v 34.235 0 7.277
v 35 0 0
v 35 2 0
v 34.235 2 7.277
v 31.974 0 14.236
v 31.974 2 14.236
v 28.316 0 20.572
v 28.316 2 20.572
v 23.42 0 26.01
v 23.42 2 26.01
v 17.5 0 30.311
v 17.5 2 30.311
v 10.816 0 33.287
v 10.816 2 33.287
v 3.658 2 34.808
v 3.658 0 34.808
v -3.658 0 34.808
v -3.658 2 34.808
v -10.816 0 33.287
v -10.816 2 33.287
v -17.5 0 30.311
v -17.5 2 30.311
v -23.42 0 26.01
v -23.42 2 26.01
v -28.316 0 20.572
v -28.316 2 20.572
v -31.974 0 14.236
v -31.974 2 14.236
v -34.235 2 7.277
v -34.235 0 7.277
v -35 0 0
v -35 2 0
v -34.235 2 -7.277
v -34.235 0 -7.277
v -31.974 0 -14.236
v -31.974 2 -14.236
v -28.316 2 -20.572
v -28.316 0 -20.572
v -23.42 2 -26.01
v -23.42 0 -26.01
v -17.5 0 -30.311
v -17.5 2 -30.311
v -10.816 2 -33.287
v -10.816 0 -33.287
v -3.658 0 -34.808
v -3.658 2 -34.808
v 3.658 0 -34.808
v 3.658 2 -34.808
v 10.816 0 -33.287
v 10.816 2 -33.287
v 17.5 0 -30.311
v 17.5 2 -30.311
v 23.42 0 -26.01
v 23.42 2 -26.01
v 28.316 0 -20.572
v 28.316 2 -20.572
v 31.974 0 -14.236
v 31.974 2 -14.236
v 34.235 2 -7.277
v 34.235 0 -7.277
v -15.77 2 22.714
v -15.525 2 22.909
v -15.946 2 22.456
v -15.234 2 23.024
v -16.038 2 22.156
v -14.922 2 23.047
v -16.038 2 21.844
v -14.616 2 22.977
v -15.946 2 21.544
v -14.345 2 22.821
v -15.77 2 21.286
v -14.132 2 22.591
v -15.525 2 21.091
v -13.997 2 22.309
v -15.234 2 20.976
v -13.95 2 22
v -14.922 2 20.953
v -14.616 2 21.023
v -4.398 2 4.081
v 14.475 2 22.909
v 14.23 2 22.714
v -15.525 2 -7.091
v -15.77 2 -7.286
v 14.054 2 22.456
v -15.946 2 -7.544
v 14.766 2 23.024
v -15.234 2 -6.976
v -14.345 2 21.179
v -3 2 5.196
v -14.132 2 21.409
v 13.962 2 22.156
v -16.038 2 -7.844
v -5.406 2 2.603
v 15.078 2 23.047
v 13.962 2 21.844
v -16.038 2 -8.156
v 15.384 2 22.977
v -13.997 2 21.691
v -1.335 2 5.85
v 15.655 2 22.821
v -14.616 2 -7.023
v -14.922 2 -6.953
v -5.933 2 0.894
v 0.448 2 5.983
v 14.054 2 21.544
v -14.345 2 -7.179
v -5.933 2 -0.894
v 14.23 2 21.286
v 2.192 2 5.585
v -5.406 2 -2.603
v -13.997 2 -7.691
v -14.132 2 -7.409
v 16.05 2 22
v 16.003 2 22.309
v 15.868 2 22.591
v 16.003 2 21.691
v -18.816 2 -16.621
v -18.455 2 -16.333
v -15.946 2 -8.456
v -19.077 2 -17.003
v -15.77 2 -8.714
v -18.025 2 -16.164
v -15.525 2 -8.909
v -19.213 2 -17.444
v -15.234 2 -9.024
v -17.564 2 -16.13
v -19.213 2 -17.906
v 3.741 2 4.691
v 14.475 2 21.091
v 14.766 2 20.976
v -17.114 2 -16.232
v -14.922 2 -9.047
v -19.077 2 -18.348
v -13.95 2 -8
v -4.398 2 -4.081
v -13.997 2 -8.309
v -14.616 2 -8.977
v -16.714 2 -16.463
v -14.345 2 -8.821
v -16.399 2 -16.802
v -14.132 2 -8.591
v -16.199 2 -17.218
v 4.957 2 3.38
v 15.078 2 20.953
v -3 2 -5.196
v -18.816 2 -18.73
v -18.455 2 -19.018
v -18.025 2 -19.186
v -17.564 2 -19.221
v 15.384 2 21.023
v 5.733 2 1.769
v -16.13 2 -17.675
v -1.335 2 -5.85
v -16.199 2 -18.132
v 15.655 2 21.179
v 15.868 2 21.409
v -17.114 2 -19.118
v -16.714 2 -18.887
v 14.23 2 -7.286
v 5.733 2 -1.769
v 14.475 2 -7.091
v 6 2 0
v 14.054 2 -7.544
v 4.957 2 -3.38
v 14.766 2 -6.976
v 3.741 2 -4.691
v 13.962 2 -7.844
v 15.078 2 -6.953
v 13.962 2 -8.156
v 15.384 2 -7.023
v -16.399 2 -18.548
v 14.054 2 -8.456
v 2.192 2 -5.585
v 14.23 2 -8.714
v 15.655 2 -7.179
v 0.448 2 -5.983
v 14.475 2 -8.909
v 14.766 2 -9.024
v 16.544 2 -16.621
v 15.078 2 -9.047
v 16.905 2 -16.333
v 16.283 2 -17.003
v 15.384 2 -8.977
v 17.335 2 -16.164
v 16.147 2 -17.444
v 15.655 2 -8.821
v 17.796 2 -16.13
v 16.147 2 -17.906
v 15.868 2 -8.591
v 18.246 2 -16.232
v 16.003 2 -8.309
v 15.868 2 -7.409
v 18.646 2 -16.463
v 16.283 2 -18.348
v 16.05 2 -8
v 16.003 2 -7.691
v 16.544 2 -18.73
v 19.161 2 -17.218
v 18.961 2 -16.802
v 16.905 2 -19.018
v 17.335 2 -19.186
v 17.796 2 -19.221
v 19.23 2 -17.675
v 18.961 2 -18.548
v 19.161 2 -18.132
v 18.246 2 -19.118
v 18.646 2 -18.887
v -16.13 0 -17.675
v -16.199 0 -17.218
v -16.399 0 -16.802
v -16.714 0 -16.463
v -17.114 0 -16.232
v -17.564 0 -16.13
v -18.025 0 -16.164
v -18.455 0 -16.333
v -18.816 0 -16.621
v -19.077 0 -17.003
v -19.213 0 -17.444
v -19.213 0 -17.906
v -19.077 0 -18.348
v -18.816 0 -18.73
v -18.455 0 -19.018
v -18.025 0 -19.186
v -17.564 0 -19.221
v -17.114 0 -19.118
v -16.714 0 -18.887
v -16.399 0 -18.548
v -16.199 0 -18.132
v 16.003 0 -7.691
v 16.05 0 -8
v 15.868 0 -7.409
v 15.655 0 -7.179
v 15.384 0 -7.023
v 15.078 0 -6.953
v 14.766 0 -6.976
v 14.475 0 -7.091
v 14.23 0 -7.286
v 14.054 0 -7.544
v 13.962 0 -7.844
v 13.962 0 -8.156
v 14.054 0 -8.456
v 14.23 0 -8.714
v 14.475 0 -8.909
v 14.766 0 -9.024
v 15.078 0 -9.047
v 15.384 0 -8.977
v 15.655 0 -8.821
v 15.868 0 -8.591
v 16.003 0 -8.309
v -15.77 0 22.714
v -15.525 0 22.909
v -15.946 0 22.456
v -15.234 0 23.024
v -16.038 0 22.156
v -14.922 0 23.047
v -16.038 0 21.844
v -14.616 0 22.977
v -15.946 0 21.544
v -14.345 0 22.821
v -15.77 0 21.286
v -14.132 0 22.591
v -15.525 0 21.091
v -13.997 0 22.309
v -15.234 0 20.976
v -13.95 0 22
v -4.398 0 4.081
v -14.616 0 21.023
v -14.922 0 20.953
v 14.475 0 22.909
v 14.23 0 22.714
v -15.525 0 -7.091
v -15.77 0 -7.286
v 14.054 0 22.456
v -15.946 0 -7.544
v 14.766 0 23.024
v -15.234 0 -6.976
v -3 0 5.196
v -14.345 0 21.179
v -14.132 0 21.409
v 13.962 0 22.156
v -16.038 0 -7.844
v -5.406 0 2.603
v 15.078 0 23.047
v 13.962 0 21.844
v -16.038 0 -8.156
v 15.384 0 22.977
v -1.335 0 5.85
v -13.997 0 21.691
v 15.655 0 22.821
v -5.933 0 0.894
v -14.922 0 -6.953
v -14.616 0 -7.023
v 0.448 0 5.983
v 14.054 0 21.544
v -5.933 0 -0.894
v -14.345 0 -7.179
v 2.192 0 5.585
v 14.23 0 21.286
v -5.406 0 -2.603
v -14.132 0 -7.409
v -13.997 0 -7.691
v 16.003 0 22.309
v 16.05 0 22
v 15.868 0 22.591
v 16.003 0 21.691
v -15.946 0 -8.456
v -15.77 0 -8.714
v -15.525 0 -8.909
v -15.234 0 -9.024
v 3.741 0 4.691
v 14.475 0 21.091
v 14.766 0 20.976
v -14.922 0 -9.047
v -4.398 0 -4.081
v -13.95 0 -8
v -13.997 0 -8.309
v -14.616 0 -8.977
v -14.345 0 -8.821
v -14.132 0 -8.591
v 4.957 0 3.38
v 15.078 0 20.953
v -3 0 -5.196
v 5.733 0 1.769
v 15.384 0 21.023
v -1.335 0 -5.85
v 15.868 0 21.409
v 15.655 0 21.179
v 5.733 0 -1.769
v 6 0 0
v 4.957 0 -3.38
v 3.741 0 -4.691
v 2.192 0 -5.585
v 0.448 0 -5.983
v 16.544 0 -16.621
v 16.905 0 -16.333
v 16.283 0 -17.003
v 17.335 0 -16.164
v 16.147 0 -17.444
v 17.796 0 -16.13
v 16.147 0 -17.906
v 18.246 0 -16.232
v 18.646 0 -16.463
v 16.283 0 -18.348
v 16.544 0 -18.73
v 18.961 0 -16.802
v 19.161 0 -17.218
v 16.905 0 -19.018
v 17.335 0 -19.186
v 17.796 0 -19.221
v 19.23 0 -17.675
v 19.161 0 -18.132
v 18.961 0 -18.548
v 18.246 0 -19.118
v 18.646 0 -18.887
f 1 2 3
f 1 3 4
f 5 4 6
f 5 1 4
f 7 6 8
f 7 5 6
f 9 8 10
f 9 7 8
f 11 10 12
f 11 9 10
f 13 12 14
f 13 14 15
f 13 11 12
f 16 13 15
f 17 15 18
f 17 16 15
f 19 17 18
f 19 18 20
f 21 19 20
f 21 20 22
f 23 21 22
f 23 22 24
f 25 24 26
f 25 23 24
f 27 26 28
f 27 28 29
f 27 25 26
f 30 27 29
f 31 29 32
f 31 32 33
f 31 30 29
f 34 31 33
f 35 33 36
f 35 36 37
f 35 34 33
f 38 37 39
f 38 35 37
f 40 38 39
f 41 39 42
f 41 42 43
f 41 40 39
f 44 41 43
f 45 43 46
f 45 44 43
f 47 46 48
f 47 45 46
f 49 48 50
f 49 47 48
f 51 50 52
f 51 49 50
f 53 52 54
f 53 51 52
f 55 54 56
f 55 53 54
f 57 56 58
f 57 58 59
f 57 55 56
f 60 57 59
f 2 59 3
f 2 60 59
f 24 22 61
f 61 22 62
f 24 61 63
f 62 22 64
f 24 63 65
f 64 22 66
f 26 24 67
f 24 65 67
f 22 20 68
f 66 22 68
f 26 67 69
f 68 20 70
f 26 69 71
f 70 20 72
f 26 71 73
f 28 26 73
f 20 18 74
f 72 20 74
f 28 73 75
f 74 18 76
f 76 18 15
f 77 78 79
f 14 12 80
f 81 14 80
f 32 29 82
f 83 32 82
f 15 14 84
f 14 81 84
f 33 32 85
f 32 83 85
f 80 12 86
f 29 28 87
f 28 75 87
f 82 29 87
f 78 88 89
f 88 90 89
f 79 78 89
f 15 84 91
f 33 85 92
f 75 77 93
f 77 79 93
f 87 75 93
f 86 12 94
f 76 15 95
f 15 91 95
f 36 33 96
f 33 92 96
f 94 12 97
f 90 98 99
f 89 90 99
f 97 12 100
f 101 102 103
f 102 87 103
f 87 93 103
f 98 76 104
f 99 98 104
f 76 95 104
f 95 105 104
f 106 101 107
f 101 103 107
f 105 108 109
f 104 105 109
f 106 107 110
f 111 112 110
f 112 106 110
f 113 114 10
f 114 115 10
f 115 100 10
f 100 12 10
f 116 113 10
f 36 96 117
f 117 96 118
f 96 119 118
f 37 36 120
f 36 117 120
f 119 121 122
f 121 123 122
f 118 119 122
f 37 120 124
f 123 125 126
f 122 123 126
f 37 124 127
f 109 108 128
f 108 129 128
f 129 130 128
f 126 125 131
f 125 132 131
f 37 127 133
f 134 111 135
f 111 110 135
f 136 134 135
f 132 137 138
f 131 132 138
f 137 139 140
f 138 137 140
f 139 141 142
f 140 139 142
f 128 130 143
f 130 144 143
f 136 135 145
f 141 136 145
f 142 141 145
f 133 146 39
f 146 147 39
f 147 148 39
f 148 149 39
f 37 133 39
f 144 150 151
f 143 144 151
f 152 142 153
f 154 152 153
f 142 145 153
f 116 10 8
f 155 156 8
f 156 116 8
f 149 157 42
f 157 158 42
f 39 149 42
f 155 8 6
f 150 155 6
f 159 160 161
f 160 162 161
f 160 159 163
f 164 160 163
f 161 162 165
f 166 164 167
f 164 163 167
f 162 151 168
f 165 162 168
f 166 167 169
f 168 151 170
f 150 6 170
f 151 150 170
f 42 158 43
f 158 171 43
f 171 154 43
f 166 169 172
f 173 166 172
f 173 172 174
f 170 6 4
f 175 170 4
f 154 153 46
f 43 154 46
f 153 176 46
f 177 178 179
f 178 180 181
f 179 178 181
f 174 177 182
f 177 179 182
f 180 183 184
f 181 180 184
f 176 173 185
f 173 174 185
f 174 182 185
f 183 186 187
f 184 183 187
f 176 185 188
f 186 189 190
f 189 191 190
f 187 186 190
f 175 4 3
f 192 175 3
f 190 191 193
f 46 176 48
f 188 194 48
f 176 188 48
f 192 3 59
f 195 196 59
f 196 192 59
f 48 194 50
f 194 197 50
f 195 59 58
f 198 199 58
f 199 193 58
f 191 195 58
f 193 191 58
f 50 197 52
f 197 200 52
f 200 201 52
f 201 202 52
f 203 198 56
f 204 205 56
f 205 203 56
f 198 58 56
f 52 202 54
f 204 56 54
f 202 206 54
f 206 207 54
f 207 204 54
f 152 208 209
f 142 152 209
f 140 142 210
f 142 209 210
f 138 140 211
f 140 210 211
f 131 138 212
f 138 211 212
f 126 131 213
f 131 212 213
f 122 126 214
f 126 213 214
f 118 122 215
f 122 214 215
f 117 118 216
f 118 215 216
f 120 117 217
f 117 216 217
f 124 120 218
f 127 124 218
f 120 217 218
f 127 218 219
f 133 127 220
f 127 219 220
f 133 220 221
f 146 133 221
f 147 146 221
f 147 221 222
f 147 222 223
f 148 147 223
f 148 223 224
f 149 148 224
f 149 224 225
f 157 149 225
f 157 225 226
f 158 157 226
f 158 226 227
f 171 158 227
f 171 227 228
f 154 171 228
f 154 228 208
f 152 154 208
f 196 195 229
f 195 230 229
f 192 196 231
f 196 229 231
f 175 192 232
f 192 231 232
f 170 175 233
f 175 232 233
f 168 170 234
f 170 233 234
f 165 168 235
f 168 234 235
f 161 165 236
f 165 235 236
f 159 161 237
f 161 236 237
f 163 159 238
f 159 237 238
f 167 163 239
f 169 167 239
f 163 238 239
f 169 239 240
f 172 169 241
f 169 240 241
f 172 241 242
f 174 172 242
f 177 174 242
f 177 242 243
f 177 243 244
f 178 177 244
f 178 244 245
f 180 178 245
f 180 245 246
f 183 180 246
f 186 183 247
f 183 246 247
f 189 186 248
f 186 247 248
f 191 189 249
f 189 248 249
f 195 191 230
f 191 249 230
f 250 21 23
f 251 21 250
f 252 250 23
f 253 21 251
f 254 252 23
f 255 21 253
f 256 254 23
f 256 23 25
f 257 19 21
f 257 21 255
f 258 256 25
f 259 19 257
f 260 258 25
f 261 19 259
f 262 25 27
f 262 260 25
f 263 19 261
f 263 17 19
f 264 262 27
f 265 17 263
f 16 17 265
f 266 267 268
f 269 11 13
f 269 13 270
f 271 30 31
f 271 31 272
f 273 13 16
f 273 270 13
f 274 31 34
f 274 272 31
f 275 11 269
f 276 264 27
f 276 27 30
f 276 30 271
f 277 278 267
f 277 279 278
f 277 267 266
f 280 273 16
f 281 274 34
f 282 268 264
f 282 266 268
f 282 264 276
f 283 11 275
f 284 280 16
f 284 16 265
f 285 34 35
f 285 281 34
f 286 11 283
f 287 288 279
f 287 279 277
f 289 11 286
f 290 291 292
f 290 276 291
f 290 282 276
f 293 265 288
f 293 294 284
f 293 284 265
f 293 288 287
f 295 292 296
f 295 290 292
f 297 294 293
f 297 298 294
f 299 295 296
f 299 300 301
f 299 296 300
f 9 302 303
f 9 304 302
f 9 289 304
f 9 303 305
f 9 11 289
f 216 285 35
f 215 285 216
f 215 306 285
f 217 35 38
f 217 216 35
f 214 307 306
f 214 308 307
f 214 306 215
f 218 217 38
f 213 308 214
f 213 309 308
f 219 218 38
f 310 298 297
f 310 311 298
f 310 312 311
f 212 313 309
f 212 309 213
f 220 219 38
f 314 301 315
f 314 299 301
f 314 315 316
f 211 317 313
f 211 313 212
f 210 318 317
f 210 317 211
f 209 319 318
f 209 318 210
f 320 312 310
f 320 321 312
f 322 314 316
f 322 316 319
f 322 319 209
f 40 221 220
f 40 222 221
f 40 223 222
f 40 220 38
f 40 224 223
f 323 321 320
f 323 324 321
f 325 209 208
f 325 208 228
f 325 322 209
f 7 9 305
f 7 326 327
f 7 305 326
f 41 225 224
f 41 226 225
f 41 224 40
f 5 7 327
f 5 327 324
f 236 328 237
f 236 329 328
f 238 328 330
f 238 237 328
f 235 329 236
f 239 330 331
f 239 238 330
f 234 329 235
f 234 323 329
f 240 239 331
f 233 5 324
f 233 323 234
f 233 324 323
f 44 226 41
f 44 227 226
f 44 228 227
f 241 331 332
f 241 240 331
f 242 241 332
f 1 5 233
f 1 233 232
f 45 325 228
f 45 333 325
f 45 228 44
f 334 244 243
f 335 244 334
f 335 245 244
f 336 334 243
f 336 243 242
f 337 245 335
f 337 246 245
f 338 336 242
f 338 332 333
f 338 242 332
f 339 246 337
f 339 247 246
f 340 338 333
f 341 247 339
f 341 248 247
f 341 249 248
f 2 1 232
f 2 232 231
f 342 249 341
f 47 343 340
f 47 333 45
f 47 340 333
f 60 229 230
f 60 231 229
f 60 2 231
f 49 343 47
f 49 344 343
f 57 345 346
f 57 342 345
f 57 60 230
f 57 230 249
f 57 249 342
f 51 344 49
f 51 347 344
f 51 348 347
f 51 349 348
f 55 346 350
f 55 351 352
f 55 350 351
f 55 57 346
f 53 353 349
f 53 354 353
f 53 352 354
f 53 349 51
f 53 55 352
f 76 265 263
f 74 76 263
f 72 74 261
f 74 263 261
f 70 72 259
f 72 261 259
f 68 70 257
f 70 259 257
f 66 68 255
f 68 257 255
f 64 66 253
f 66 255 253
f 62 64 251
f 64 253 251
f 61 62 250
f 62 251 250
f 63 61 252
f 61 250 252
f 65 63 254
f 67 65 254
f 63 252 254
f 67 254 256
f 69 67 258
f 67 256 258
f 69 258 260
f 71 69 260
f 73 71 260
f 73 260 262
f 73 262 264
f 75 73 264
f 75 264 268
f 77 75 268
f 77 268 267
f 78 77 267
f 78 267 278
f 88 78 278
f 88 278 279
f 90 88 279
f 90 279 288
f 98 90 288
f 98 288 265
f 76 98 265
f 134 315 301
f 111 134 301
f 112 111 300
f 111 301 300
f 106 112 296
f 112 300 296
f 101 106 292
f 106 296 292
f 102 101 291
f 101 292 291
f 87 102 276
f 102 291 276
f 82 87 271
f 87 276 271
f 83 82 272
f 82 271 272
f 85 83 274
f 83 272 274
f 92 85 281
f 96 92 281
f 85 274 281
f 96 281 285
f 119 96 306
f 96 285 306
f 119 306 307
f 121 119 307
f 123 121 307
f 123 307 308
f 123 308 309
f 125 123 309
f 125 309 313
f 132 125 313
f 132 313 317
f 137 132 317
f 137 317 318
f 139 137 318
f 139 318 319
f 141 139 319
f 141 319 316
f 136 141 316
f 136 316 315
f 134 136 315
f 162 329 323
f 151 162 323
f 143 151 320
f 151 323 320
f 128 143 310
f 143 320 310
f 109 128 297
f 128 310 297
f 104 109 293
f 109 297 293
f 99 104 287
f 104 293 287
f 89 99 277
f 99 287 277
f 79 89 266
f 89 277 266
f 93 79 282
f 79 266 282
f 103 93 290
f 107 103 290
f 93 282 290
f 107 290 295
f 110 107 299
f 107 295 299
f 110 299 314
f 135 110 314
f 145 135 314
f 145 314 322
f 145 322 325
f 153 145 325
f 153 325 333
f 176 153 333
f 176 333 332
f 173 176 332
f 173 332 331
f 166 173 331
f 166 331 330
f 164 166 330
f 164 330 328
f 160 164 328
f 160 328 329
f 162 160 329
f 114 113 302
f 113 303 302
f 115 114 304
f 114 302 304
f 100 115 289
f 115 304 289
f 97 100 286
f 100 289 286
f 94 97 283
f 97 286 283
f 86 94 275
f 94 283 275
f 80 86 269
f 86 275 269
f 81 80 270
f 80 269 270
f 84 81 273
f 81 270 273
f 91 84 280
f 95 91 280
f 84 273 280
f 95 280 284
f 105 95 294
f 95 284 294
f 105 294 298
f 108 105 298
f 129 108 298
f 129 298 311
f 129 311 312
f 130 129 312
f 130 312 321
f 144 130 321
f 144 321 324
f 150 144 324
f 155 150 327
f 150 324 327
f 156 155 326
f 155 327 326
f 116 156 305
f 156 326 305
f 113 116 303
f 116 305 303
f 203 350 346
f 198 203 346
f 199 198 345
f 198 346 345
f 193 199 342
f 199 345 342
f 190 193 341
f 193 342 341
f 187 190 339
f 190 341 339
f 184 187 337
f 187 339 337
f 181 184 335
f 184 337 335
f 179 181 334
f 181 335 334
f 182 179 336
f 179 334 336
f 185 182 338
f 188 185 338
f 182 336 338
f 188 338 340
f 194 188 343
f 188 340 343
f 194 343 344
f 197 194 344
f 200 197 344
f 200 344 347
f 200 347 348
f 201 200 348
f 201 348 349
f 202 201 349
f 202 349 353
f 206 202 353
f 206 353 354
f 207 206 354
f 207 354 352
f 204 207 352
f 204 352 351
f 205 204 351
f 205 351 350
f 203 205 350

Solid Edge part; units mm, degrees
sketch "Sketch1" plane through (0, 0, 0) normal (0, -1, 0) x (1, 0, 0)
  circle A0 centre (0, 0) radius 35
  circle A1 centre (0, 0) radius 6
  dimension "D1" = 8
extrude "Protrusion1" add sketch "Sketch1" against normal blind 2
sketch "Sketch2" plane through (0, 0, 0) normal (0, -1, 0) x (1, 0, 0)
  circle A0 centre (-15, 22) radius 1.05
  circle A1 centre (-15, -8) radius 1.05
  circle A2 centre (15, 22) radius 1.05
  circle A3 centre (15, -8) radius 1.05
  dimension "D1" = 8
extrude "ExtrudedCutout_4" cut sketch "Sketch2" along normal mid plane 224.2374
sketch "Sketch3" plane through (0, 0, 0) normal (0, -1, 0) x (1, 0, 0)
  circle A0 centre (-17.68, -17.6753) radius 1.55
  circle A1 centre (17.68, -17.6753) radius 1.55
  dimension "D1" = 8
extrude "ExtrudedCutout_5" cut sketch "Sketch3" along normal mid plane 156.4567
